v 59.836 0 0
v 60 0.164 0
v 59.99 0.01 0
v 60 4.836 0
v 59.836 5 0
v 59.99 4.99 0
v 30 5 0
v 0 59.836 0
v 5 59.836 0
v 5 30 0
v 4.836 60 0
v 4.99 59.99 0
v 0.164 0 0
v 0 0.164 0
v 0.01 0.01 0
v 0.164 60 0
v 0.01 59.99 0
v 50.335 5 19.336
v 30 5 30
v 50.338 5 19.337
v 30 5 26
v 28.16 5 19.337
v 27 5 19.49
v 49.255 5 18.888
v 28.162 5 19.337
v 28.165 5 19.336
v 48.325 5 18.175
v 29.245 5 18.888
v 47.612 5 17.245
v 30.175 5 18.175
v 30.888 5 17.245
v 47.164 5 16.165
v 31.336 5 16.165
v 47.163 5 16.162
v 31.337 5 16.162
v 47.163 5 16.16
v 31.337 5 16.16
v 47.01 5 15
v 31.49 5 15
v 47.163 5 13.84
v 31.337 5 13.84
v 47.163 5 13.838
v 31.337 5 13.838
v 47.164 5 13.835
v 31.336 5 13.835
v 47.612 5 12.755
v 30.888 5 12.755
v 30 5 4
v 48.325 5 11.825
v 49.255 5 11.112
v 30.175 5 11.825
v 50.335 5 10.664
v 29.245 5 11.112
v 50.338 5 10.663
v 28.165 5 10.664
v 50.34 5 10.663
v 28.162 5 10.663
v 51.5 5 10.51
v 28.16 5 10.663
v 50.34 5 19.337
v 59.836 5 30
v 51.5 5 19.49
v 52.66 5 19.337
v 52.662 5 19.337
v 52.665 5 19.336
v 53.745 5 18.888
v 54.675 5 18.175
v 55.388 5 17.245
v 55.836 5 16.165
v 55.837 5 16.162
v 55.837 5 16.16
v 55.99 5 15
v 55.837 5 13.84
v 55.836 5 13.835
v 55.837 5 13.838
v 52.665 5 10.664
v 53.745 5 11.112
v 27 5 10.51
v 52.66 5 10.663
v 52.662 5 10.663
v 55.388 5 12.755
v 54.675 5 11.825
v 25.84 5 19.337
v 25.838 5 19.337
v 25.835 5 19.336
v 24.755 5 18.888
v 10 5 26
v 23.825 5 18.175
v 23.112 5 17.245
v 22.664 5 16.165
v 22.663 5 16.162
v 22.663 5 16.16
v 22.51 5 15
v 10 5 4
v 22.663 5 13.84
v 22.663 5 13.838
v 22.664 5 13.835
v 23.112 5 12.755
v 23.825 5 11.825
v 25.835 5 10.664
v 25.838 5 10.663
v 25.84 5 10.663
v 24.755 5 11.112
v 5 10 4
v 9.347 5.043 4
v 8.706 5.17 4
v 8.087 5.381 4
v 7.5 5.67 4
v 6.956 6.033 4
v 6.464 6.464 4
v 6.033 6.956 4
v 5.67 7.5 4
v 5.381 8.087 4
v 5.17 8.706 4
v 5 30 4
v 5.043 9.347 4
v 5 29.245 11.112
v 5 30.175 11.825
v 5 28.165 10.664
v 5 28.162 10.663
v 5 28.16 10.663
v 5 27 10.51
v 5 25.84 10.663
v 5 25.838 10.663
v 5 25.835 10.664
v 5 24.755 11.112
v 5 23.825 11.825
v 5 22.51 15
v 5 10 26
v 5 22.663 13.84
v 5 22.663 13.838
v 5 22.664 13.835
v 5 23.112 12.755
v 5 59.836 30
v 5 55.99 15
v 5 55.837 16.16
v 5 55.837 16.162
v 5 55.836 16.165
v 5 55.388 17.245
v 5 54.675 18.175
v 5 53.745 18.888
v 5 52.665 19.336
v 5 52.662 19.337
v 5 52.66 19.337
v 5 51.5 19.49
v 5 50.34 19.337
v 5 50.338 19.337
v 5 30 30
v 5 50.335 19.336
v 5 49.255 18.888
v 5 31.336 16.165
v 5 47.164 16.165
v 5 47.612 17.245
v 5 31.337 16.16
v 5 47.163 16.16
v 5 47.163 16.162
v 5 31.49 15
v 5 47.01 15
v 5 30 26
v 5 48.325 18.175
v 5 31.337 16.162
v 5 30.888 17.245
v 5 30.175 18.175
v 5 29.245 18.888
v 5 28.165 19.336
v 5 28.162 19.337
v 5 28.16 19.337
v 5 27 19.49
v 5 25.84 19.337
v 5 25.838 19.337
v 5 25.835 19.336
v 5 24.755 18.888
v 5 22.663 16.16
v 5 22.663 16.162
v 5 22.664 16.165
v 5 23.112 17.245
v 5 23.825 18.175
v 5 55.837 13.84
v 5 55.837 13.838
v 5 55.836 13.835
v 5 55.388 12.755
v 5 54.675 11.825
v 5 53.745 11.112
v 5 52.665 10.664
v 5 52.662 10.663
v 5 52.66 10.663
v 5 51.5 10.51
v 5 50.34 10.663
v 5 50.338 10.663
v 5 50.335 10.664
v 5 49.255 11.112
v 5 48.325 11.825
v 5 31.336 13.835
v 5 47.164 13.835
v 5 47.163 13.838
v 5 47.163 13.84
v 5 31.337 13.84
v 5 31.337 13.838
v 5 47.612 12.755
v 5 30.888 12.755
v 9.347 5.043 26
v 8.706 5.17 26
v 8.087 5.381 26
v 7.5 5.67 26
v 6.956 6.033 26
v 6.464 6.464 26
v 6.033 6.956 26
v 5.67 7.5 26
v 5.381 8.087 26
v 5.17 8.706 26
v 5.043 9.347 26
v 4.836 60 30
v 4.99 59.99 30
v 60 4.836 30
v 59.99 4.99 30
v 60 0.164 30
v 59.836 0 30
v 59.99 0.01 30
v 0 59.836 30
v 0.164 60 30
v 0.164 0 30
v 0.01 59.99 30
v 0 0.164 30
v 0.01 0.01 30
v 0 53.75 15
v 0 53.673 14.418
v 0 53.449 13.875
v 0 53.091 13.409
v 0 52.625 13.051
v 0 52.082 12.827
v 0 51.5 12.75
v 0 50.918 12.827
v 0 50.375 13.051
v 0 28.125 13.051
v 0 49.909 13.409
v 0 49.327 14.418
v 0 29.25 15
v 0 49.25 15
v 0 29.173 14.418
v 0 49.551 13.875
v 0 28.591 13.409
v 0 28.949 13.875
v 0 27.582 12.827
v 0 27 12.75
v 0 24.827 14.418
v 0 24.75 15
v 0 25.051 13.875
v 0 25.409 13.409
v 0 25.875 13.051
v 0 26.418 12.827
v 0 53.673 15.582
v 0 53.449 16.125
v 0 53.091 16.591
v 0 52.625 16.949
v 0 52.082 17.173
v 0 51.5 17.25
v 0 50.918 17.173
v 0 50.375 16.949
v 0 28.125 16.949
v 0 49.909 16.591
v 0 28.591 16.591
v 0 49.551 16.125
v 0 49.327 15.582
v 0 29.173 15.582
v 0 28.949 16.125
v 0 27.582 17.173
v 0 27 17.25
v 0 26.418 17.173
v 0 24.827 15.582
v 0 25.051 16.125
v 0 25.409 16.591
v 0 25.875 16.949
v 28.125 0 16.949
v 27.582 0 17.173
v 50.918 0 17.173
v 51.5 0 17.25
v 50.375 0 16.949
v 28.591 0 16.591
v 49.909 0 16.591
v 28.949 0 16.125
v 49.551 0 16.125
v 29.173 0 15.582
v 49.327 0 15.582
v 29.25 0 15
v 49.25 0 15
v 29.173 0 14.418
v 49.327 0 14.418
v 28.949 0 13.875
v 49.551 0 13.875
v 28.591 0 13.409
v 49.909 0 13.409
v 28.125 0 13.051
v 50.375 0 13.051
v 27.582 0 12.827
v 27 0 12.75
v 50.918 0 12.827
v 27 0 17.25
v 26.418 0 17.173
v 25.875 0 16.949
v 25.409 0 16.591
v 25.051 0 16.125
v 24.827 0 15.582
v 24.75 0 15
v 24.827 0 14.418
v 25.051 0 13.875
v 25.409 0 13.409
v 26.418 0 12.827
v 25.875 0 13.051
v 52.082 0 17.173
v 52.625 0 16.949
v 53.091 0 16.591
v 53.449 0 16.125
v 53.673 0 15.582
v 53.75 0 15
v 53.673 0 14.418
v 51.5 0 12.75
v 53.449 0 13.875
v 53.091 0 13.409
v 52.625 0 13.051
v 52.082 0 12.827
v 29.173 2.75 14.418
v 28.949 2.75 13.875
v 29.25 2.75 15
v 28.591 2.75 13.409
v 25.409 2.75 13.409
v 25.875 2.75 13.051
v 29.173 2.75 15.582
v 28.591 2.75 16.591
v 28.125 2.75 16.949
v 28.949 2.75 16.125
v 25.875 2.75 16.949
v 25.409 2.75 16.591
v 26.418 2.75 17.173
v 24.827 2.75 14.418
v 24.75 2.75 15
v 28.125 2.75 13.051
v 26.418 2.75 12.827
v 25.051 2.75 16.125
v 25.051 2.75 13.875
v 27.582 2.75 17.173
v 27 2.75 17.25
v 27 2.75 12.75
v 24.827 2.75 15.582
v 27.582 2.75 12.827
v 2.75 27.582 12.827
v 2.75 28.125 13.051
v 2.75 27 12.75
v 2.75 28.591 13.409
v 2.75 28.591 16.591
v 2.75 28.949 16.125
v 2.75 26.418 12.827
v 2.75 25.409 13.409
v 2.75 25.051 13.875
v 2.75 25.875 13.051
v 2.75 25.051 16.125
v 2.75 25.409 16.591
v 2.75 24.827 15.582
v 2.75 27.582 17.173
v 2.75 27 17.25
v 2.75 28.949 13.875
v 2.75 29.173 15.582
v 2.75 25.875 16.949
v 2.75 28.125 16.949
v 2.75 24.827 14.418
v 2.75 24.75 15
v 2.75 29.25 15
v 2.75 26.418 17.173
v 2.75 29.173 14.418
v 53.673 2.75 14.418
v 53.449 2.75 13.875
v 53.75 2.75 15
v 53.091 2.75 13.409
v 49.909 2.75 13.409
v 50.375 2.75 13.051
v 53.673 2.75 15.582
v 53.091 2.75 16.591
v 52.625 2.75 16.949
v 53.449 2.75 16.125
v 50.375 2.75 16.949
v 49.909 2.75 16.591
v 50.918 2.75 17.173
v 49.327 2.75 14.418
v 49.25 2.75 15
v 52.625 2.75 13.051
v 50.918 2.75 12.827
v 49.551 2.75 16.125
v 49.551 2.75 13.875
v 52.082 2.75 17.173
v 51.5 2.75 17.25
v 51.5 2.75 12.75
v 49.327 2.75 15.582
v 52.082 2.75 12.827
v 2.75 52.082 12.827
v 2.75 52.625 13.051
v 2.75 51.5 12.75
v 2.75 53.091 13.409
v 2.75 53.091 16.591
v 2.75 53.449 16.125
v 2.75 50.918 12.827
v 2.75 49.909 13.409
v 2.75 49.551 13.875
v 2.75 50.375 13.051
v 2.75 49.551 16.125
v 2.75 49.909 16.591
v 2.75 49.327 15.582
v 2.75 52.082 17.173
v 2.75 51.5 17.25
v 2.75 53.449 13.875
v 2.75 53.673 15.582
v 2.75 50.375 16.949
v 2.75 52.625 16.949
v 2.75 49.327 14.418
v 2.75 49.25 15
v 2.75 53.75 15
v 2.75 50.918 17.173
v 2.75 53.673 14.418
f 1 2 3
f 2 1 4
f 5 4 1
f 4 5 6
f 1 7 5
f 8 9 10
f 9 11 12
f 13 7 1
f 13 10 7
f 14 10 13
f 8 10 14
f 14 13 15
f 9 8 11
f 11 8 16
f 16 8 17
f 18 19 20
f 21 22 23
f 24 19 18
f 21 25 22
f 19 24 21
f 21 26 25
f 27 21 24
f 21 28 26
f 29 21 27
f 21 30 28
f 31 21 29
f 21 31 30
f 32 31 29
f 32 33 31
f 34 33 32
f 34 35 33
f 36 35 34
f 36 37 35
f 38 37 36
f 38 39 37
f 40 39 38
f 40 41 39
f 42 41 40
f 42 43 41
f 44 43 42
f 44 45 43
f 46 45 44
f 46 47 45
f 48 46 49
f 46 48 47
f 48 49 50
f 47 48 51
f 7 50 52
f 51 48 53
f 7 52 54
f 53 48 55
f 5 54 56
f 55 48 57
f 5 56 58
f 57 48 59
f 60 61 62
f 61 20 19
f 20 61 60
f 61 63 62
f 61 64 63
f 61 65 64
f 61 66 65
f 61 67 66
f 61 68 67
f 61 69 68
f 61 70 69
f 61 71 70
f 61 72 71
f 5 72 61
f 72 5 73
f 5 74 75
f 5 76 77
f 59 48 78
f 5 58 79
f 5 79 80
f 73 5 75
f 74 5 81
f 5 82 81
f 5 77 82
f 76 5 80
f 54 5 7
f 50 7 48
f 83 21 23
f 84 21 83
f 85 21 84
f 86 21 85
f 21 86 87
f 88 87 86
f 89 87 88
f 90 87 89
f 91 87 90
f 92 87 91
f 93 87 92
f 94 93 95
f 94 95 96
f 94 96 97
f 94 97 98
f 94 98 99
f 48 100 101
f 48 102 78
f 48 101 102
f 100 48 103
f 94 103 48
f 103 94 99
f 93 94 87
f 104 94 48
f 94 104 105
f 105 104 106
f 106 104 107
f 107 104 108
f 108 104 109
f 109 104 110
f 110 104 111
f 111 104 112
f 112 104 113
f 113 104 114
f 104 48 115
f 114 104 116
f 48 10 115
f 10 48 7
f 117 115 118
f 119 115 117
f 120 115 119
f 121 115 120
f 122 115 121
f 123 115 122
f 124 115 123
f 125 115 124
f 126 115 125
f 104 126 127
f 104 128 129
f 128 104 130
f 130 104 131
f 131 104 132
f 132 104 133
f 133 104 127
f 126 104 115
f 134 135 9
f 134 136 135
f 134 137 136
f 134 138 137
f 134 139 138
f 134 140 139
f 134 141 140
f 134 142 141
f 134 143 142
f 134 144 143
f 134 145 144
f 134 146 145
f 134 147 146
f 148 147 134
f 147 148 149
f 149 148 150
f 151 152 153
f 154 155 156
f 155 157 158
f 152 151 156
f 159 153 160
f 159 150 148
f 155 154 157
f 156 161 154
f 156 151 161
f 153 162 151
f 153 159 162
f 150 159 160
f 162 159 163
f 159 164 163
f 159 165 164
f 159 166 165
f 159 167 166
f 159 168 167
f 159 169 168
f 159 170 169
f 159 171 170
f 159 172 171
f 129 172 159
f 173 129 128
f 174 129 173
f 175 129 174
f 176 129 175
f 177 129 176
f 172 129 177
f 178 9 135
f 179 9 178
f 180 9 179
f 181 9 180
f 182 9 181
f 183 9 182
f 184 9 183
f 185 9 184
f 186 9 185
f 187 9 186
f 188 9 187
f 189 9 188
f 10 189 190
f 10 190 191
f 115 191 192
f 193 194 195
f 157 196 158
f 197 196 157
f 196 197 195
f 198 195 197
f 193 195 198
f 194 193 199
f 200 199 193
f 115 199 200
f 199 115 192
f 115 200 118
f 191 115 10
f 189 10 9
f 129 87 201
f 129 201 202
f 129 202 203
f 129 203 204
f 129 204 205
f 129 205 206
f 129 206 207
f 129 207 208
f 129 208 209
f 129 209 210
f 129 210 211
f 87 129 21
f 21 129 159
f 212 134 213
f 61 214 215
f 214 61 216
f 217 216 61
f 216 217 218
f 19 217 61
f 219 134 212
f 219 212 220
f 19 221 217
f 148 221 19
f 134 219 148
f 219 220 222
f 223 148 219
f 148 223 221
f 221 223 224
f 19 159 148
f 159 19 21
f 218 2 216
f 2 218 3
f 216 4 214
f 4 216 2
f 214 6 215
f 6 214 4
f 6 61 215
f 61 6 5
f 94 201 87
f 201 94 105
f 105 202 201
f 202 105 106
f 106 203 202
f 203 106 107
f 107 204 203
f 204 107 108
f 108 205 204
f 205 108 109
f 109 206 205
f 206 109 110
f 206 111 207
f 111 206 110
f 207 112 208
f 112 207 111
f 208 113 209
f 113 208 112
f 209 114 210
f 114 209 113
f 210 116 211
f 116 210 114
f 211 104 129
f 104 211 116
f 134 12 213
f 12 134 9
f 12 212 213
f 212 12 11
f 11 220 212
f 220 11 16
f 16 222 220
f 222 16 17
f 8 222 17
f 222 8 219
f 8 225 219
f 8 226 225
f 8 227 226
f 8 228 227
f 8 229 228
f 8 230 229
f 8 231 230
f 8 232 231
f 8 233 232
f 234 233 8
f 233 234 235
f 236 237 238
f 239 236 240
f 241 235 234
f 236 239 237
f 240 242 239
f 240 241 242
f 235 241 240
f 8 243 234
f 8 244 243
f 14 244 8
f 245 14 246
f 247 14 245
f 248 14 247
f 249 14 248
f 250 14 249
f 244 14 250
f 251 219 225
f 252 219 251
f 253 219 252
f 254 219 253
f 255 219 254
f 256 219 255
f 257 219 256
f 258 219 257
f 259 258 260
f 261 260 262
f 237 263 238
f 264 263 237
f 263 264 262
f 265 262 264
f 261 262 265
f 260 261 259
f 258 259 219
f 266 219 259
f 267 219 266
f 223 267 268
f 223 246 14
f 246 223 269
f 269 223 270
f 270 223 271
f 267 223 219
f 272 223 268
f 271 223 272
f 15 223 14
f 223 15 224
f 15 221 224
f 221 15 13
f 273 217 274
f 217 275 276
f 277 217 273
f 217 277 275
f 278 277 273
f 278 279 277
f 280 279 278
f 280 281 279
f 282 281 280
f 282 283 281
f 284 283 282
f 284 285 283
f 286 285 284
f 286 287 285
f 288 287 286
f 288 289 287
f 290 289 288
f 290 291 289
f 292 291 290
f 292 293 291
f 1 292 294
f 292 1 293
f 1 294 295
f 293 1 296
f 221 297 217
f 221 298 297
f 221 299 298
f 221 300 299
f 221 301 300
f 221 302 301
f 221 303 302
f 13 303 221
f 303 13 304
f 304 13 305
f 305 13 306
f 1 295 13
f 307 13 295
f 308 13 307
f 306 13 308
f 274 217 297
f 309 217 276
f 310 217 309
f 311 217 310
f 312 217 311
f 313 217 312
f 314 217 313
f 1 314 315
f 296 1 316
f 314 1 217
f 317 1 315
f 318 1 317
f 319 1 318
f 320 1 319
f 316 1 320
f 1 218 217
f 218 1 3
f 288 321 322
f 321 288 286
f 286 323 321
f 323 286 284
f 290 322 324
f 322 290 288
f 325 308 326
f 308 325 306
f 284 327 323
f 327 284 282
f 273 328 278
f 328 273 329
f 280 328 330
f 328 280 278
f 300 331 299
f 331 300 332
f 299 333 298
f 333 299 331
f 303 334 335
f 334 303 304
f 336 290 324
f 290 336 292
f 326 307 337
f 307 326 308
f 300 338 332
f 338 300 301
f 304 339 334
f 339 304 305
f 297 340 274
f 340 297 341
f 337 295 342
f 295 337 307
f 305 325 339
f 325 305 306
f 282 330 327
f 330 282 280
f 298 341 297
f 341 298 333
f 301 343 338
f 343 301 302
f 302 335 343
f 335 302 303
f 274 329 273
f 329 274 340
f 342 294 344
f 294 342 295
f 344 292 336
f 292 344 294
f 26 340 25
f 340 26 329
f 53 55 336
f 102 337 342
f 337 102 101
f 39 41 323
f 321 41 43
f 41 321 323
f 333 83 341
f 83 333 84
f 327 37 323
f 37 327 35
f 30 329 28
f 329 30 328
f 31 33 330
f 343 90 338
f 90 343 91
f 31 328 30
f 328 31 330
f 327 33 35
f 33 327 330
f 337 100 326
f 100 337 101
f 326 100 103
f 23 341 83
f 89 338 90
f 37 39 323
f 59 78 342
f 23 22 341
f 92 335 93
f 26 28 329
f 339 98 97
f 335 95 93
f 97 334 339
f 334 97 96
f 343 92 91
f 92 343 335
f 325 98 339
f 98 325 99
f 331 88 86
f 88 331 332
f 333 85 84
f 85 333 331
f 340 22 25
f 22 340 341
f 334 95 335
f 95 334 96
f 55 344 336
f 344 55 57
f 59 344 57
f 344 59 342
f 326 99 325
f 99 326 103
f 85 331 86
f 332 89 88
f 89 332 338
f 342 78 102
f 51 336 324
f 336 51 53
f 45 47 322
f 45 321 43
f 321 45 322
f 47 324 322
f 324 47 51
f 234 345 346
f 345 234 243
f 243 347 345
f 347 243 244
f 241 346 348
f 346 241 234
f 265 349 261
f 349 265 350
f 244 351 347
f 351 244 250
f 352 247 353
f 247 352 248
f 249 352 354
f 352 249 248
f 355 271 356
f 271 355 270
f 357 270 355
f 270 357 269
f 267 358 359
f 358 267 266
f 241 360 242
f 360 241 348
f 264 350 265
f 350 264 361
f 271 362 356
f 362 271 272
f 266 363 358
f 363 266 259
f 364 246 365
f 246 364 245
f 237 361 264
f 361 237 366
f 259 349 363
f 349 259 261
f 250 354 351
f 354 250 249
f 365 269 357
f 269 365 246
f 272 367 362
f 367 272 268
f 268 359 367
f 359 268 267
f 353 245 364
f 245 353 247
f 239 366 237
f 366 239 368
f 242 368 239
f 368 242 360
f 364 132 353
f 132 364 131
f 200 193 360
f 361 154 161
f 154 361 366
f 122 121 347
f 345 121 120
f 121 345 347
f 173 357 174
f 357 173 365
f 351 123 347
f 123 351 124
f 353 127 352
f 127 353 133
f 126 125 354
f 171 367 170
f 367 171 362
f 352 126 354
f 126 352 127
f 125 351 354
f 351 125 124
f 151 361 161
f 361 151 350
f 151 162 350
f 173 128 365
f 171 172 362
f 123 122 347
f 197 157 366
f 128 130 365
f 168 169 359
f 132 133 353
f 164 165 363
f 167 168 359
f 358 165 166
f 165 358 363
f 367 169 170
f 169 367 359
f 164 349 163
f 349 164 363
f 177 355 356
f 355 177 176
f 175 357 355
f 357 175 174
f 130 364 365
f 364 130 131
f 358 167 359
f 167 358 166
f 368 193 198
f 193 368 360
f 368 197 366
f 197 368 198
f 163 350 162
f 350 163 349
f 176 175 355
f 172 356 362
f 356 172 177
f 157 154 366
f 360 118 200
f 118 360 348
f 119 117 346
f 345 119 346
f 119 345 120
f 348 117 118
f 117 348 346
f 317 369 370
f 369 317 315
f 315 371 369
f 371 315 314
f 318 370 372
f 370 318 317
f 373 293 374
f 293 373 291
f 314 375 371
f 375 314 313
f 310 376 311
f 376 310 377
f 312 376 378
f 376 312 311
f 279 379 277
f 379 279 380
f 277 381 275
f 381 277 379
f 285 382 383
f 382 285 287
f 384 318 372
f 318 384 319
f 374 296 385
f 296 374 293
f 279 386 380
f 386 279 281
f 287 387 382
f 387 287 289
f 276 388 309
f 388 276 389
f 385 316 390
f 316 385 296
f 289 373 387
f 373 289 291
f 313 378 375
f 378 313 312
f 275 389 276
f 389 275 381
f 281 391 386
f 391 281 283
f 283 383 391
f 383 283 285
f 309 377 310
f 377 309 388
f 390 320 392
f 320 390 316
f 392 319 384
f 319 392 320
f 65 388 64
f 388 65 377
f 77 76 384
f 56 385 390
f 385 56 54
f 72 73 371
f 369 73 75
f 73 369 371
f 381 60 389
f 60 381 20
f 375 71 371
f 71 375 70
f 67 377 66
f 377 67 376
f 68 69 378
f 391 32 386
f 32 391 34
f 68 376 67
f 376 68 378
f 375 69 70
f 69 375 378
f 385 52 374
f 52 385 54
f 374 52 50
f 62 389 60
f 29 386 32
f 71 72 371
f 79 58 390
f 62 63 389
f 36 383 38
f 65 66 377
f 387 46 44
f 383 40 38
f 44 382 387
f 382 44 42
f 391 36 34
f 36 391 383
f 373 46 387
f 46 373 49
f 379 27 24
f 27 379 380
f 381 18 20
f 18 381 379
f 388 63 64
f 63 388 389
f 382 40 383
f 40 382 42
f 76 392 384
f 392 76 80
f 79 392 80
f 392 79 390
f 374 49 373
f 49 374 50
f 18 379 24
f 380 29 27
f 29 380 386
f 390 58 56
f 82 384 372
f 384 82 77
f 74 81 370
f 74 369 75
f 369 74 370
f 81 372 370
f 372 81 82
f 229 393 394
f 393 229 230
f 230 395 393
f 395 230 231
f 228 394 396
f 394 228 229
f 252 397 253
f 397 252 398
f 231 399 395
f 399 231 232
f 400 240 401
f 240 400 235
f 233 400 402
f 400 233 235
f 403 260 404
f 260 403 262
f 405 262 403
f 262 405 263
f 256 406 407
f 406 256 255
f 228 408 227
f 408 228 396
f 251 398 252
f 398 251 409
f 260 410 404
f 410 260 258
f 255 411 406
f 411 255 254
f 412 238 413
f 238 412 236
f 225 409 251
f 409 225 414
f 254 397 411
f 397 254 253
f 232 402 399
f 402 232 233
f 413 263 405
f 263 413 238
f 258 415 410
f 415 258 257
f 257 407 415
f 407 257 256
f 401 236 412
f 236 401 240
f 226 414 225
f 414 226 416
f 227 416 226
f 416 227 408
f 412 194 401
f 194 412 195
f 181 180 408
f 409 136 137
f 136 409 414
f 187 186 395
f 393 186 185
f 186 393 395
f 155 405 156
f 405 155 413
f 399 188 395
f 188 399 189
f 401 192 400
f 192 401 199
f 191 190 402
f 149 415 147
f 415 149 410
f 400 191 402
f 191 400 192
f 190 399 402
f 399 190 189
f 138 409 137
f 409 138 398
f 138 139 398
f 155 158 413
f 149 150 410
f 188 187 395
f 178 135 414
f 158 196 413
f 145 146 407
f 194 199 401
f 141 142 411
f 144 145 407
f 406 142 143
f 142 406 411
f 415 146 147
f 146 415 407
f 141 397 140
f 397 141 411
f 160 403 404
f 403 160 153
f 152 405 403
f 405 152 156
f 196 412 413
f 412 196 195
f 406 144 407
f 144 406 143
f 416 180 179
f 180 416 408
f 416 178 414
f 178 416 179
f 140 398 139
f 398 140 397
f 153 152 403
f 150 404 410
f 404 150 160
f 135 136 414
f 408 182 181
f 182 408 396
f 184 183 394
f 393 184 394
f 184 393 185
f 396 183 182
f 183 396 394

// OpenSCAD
// Уголок-кронштейн: две полки, рёбра жёсткости по краям, потайные отверстия.
// Лежит так, как печатается, — на боку: слои огибают угол, и он не лопнет по сгибу.
$fn = 48;

/* [Уголок] */
// Длина полок, мм
arm = 60;               // [30:5:150]
// Ширина, мм
width = 30;             // [15:5:80]
// Толщина, мм
thickness = 5;          // [3:0.5:12]
/* [Рёбра жёсткости] */
// Размер ребра, мм
gusset = 30;            // [0:1:100]
// Толщина ребра, мм
gusset_thickness = 4;   // [2:0.5:10]
/* [Отверстия] */
// Диаметр самореза, мм
screw = 4.5;            // [3:0.5:8]
// Диаметр шляпки, мм
head = 9;               // [6:0.5:14]

t = thickness;
g = min(gusset, arm - 2);
// Два отверстия на полке — дальше от угла, чем ребро, чтобы не мешало отвёртке.
holes = [max(t + head / 2 + 3, arm * 0.45), arm - head / 2 - 4];

// Профиль уголка: внутренний угол скруглён.
module profile() {
    offset(r = -t) offset(r = t)
        union() {
            square([arm, t]);
            square([t, arm]);
        }
}

module rib() {
    linear_extrude(height = gusset_thickness)
        polygon([[t, t], [g, t], [t, g]]);
}

// Отверстие сквозь полку и потай на внутренней стороне.
module hole() {
    translate([0, 0, -1]) cylinder(h = t + 2, d = screw, $fn = 24);
    translate([0, 0, t - (head - screw) / 2])
        cylinder(h = (head - screw) / 2 + 0.01, d1 = screw, d2 = head, $fn = 24);
}

difference() {
    union() {
        linear_extrude(height = width) profile();
        if (g > t + 2) {
            rib();
            translate([0, 0, width - gusset_thickness]) rib();
        }
    }
    for (p = holes) {
        // Полка вдоль x: отверстие по y.
        translate([p, 0, width / 2]) rotate([-90, 0, 0]) hole();
        // Полка вдоль y: отверстие по x.
        translate([0, p, width / 2]) rotate([0, 90, 0]) hole();
    }
}
